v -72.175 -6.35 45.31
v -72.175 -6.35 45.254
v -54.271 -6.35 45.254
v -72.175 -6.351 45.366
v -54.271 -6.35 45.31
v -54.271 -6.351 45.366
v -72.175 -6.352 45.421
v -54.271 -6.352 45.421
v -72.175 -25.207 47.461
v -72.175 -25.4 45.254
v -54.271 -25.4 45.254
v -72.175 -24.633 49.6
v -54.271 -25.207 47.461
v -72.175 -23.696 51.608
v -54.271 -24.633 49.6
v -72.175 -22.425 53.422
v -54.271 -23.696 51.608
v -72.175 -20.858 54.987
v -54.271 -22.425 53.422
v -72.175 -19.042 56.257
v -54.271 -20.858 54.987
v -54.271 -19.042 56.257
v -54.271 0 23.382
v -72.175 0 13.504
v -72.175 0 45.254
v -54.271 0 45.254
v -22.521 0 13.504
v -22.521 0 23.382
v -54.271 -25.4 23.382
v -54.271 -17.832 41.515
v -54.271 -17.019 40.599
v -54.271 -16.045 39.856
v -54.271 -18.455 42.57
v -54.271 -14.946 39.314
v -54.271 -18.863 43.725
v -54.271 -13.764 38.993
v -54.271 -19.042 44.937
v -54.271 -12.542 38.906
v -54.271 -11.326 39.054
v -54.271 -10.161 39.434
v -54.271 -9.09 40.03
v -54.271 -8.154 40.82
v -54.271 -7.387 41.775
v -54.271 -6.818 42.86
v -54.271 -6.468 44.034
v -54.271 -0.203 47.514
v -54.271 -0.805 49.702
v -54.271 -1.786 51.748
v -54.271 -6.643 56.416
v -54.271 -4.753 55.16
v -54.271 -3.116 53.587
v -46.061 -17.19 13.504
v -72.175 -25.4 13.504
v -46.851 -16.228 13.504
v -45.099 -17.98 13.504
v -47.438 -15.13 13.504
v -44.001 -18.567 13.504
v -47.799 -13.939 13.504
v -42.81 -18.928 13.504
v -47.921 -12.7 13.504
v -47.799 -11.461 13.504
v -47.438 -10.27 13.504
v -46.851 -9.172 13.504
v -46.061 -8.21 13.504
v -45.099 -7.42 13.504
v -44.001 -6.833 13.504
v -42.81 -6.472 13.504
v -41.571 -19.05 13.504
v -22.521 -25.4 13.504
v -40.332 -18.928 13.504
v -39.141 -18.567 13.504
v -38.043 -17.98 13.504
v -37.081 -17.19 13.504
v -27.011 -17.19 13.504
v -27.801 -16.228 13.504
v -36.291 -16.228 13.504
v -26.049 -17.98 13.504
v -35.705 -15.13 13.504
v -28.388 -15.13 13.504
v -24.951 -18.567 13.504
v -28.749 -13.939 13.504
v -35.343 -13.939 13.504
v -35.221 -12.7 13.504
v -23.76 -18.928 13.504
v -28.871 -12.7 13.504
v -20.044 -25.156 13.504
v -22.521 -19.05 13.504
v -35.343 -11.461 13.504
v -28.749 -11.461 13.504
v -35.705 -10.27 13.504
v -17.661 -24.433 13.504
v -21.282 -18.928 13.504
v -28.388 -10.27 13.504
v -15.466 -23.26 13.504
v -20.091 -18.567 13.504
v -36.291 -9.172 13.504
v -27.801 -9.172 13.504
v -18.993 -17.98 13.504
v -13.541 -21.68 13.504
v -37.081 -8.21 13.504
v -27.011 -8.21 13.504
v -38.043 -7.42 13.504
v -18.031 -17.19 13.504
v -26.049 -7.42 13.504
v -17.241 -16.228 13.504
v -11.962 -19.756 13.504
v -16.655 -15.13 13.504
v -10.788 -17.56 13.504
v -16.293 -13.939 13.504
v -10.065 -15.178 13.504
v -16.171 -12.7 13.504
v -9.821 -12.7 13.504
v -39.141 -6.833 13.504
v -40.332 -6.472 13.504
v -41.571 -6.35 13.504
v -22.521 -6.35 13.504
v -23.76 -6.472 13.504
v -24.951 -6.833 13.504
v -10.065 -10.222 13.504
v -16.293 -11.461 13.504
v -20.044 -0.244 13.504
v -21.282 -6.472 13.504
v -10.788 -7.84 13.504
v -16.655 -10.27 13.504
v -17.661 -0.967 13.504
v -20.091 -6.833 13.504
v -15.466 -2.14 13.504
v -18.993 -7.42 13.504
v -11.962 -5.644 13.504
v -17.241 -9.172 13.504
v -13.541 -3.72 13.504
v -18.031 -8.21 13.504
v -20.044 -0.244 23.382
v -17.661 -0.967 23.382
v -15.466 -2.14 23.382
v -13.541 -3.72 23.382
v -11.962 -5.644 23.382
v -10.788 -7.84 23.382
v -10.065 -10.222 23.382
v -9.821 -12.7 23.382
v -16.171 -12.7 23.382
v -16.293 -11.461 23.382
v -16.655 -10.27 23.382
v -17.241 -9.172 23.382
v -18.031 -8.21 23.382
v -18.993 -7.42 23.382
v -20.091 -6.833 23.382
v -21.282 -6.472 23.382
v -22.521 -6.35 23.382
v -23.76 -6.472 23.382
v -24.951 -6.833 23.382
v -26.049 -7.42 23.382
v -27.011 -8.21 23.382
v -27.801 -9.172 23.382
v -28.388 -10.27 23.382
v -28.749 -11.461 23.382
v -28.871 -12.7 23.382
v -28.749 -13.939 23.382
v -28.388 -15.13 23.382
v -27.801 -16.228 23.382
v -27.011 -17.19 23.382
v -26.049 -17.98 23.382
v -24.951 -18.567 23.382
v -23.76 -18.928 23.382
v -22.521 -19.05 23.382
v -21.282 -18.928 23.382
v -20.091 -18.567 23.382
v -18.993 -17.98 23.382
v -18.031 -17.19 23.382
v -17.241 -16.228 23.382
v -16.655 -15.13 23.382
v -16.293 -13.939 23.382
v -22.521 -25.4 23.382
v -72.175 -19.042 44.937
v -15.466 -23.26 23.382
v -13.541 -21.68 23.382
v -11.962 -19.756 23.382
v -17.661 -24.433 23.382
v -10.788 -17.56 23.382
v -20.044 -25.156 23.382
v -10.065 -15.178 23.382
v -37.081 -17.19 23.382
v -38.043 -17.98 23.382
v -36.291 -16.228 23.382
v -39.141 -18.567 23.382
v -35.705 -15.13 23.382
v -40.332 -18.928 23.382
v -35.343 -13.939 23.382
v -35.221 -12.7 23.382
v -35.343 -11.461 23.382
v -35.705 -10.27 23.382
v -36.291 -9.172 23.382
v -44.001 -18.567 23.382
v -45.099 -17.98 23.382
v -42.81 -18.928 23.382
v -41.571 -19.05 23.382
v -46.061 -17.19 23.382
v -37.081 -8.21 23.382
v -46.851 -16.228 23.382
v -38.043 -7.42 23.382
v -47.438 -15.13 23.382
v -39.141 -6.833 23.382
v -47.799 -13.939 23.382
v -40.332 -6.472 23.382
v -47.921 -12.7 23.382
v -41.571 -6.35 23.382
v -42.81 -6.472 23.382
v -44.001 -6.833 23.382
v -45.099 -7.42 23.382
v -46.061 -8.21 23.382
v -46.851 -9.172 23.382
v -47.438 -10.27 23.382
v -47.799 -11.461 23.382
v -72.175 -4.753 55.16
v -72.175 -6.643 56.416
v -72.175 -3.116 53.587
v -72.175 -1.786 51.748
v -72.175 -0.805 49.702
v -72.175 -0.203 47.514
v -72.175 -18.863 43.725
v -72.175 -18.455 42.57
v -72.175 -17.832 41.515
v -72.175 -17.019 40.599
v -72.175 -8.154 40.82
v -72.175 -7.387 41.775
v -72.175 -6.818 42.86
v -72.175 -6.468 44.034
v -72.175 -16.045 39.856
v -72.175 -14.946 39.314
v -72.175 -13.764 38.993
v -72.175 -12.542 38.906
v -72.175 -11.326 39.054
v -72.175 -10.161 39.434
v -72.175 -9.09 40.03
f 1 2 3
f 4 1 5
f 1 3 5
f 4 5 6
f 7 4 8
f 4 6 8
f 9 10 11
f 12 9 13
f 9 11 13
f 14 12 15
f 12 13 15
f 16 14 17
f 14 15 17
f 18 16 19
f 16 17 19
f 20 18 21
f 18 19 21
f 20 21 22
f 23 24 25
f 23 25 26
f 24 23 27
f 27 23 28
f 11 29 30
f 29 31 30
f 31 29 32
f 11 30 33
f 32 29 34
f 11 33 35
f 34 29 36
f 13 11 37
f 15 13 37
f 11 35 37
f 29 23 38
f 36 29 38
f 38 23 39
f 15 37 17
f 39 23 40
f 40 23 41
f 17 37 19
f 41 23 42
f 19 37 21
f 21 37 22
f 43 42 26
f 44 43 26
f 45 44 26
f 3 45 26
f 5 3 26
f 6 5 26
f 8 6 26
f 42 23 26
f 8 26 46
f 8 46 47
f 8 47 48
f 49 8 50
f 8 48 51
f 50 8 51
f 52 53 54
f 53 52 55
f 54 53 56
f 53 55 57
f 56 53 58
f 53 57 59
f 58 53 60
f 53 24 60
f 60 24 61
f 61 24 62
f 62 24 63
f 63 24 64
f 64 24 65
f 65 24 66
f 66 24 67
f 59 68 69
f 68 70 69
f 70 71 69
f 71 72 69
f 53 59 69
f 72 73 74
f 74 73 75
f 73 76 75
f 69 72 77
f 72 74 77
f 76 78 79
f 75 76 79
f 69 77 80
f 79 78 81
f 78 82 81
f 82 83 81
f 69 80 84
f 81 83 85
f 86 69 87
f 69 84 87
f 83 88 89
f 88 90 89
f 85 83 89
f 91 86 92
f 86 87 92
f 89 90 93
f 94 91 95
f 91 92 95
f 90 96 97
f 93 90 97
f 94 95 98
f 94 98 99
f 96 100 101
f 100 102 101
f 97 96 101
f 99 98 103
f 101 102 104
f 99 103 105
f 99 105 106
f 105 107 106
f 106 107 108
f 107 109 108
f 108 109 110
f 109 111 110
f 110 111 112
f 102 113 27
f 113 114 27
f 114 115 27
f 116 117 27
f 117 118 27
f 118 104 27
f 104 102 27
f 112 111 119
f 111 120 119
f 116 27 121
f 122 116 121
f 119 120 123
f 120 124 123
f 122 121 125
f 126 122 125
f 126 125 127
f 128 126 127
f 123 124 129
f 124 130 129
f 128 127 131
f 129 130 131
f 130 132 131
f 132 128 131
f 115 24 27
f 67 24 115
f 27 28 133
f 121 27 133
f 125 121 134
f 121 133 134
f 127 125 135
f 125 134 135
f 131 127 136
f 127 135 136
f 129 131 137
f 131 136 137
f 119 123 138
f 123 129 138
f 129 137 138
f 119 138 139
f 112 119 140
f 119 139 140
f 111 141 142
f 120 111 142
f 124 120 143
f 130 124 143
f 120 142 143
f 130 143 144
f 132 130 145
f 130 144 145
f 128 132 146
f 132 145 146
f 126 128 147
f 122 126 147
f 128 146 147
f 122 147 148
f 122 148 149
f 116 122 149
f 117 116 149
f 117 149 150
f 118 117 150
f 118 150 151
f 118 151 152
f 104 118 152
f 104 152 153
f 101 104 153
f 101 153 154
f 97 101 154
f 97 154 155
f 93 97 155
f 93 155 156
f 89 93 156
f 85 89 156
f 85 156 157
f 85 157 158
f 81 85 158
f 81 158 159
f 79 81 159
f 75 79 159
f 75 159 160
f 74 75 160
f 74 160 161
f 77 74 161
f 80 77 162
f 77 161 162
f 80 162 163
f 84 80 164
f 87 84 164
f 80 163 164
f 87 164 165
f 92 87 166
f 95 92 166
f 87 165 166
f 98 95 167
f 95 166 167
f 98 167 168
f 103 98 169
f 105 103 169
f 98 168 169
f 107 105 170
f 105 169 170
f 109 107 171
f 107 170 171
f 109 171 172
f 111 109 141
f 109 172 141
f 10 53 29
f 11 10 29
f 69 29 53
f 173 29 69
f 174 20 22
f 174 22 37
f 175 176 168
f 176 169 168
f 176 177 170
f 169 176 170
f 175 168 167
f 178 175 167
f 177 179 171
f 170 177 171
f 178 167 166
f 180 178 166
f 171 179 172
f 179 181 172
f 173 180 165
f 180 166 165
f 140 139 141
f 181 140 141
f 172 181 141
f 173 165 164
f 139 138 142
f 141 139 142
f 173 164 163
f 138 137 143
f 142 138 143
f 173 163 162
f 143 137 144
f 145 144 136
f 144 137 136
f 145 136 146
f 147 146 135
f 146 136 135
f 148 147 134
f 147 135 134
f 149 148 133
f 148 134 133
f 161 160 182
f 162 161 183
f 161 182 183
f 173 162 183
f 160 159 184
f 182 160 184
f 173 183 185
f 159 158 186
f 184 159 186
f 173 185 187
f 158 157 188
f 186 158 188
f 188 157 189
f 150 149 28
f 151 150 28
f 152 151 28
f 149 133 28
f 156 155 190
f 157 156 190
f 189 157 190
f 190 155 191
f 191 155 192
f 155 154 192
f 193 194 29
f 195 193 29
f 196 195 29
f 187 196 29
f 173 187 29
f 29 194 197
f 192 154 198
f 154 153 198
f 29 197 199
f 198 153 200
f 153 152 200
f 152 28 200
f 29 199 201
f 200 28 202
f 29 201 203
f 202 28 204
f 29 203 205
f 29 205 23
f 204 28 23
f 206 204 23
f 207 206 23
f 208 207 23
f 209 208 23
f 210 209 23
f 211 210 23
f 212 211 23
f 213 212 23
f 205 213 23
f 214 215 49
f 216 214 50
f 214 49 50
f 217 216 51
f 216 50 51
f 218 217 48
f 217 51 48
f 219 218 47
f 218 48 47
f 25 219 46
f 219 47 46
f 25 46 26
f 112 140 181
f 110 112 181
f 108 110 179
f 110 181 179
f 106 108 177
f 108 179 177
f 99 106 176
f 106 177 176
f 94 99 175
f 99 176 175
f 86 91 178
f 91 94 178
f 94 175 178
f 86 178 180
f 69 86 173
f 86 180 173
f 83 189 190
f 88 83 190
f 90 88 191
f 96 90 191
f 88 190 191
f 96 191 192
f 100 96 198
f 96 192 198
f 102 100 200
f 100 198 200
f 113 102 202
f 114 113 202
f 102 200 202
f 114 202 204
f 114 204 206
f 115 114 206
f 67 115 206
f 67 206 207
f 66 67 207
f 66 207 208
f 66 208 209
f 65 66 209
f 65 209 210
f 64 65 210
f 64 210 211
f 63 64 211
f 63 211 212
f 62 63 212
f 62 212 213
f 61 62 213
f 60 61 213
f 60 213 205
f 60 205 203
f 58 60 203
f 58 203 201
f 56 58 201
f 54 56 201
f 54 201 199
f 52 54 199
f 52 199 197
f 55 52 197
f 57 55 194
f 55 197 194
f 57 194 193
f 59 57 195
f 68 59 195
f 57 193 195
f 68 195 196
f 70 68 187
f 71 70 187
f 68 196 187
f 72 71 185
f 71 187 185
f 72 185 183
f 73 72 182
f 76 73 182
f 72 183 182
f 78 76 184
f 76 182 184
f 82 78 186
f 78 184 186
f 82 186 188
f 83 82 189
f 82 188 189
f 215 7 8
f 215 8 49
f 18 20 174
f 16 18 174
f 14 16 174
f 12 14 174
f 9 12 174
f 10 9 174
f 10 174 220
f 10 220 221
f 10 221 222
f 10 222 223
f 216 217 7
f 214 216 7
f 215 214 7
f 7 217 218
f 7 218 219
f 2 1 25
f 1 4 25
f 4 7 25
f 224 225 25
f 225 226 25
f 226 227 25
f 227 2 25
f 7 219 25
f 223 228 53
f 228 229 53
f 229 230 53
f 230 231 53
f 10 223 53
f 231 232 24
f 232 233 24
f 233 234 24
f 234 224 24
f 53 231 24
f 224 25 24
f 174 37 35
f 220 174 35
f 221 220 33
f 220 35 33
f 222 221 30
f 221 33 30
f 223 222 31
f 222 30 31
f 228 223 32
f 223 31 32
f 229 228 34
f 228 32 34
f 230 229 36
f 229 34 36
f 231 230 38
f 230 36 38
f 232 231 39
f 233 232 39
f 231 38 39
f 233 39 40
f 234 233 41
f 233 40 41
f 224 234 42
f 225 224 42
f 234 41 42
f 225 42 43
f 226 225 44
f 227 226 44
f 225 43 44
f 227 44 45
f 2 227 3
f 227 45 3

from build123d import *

# Parameters (mm, degrees)
F1_DEPTH = 25.4
F3_DEPTH = 9.878778
F5_DEPTH = 17.904465
F7_DEPTH = 17.904465
F8_R     = 6.35
F9_DEPTH = 9.878778


with BuildPart() as f1:
    # F0 (on Front) → F1 (new body)
    with BuildSketch(Plane.XZ):
        Polygon((-72.174763, 57.95379), (-72.174763, 13.50379), (-9.821297, 13.50379), (-9.821297, 23.381569), (-54.271297, 23.381569), (-54.271297, 57.95379), align=None)
    extrude(amount=F1_DEPTH)

    # F2 (on face) → F3 (cut, through all)
    with BuildSketch(Plane.XY.offset(23.381569)):
        with BuildLine():
            Line((-9.821297, -12.7), (-9.821297, 0))
            Line((-9.821297, 0), (-22.521297, 0))
            ThreePointArc((-22.521297, 0), (-13.541041, -3.719744), (-9.821297, -12.7))
        make_face()
        with BuildLine():
            Line((-9.821297, -25.4), (-9.821297, -12.7))
            ThreePointArc((-9.821297, -12.7), (-13.541041, -21.680256), (-22.521297, -25.4))
            Line((-22.521297, -25.4), (-9.821297, -25.4))
        make_face()
    extrude(amount=-F3_DEPTH, mode=Mode.SUBTRACT)

    # F4 (on face) → F5 (cut, through all)
    with BuildSketch(Plane.YZ.offset(-54.271297)):
        with BuildLine():
            Line((-12.7, 57.95379), (-25.4, 57.95379))
            Line((-25.4, 57.95379), (-25.4, 45.25379))
            ThreePointArc((-25.4, 45.25379), (-21.680256, 54.234047), (-12.7, 57.95379))
        make_face()
        with BuildLine():
            Line((0, 57.95379), (-12.7, 57.95379))
            ThreePointArc((-12.7, 57.95379), (-3.719744, 54.234047), (0, 45.25379))
            Line((0, 45.25379), (0, 57.95379))
        make_face()
    extrude(amount=-F5_DEPTH, mode=Mode.SUBTRACT)

    # F6 (on face) → F7 (cut, through all)
    with BuildSketch(Plane.YZ.offset(-54.271297)):
        with BuildLine():
            ThreePointArc((-19.042094, 45.570553), (-12.625386, 51.603352), (-6.352213, 45.421435))
            Line((-6.352213, 45.421435), (-6.642582, 56.416124))
            ThreePointArc((-6.642582, 56.416124), (-12.863096, 57.952743), (-19.042094, 56.256874))
            Line((-19.042094, 56.256874), (-19.042094, 45.570553))
        make_face()
        with BuildLine():
            ThreePointArc((-19.042094, 44.937028), (-12.541569, 38.905767), (-6.35, 45.25379))
            ThreePointArc((-6.35, 45.25379), (-6.350553, 45.33762), (-6.352213, 45.421435))
            ThreePointArc((-6.352213, 45.421435), (-12.625386, 51.603352), (-19.042094, 45.570553))
            Line((-19.042094, 45.570553), (-19.042094, 44.937028))
        make_face()
    extrude(amount=-F7_DEPTH, mode=Mode.SUBTRACT)

    # F8 (on face) → F9 (cut, through all)
    with BuildSketch(Plane.XY.offset(23.381569)):
        with Locations((-41.571297, -12.7)):
            Circle(F8_R)
        with Locations((-22.521297, -12.7)):
            Circle(F8_R)
    extrude(amount=-F9_DEPTH, mode=Mode.SUBTRACT)


solid = f1.part
